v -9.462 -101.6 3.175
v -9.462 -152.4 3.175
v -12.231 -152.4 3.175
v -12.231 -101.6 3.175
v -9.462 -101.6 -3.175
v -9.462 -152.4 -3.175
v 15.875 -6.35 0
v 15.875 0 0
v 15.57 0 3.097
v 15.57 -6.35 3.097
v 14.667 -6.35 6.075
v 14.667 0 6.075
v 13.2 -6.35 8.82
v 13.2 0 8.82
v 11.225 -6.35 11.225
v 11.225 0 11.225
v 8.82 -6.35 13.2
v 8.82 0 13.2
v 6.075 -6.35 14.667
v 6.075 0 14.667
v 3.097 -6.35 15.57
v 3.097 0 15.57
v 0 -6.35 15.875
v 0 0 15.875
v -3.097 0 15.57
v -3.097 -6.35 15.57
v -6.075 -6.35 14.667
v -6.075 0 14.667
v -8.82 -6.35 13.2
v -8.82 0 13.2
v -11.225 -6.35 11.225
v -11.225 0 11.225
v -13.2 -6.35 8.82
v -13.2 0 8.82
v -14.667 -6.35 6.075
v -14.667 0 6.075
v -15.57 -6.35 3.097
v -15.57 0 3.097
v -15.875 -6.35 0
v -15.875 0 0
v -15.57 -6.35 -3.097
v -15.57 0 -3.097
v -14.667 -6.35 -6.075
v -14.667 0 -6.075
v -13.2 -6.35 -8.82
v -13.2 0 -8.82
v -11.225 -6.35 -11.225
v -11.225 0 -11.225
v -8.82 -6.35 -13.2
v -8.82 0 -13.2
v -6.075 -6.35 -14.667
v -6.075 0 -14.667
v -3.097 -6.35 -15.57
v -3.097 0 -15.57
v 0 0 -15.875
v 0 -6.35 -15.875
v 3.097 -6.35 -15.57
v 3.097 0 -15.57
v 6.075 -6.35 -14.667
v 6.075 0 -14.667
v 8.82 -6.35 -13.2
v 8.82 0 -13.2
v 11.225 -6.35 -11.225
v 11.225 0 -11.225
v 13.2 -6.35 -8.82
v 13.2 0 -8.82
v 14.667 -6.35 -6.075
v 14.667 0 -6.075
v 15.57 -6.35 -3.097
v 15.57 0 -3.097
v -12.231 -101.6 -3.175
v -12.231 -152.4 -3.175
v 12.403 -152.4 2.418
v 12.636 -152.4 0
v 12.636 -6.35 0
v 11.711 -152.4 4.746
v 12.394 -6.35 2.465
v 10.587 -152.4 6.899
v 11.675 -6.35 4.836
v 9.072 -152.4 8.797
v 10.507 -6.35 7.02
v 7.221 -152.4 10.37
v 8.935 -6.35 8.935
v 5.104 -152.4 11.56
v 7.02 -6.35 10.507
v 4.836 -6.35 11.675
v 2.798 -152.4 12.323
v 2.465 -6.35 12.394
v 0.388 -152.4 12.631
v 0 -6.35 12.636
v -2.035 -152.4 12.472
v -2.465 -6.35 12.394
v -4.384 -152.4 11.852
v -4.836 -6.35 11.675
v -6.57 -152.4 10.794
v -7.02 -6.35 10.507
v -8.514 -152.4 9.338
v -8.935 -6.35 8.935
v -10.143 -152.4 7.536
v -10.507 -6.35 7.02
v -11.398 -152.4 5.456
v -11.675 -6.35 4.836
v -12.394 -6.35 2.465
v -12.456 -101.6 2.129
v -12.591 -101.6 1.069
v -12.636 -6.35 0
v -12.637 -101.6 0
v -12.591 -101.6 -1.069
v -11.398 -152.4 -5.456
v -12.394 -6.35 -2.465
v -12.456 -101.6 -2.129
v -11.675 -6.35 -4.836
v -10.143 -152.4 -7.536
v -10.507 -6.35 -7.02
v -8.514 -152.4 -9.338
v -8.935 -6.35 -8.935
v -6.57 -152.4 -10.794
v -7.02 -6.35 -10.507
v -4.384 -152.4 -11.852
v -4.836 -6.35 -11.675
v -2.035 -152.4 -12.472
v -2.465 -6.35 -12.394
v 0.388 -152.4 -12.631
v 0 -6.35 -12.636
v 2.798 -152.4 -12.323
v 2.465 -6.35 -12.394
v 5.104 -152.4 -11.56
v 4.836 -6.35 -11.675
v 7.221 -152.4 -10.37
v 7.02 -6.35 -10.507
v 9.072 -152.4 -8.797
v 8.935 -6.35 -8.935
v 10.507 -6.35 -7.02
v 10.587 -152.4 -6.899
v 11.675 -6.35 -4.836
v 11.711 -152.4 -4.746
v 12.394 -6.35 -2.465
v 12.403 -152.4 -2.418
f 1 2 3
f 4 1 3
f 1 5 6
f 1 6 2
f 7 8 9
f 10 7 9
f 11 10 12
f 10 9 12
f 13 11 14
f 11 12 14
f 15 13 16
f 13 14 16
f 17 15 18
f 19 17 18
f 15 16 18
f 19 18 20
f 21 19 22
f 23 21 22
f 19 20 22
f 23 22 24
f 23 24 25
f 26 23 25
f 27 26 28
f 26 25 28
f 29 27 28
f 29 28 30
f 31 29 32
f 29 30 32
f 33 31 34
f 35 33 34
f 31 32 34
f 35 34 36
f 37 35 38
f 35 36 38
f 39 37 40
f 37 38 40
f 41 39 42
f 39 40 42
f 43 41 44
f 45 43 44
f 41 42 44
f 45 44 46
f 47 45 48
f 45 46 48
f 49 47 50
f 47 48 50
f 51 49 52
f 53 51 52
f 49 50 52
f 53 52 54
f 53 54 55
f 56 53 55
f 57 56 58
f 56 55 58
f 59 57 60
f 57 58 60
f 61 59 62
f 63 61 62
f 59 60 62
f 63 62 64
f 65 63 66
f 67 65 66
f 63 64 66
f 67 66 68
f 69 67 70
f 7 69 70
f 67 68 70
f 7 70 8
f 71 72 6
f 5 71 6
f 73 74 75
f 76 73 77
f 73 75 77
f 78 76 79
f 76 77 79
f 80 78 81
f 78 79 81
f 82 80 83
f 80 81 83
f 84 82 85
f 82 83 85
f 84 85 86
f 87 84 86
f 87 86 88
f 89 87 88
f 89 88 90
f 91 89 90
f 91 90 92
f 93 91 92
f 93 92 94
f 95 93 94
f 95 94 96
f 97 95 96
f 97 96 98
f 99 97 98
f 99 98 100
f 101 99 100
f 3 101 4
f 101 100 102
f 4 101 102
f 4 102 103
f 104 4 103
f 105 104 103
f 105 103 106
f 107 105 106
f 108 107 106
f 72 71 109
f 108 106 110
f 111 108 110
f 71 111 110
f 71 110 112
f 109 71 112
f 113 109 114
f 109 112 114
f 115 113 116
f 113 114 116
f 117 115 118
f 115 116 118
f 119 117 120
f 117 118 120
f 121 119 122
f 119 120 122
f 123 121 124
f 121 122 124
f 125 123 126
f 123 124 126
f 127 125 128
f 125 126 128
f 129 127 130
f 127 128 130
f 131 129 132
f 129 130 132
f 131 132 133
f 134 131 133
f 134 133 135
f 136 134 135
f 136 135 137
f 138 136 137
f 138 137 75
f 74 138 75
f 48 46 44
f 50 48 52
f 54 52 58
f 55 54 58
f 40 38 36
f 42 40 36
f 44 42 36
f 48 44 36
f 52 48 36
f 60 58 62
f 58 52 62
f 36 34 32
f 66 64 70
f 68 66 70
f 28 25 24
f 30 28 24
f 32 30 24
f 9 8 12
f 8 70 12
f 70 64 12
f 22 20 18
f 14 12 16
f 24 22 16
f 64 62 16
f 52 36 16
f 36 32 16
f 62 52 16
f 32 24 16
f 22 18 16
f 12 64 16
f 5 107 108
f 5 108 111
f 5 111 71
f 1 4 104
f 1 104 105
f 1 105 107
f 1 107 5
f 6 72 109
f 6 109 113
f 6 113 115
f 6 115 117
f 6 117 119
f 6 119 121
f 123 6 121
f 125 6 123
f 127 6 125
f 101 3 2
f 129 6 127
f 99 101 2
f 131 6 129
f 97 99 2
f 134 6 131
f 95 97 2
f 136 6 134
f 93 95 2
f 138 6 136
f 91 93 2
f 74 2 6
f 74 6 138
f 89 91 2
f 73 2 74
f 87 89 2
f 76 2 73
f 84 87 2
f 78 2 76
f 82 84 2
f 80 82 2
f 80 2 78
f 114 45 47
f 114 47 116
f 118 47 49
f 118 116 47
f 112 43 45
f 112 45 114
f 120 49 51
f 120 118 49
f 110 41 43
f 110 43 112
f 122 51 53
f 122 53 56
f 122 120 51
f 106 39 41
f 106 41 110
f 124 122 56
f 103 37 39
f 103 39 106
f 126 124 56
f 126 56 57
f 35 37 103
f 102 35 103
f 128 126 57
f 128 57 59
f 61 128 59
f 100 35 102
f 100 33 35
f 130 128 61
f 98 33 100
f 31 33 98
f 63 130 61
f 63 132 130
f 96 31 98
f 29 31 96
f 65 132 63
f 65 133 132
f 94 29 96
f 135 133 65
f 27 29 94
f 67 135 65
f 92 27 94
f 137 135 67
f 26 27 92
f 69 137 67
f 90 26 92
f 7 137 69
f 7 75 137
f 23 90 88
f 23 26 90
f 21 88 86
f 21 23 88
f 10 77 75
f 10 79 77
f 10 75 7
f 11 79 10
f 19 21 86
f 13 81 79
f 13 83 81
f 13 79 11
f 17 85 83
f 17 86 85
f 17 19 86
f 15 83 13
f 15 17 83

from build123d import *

# Parameters (mm, degrees)
F0_R     = 15.875
F0_R_2   = 12.6365
F1_DEPTH = 6.35
F2_R     = 12.6365
F3_DEPTH = 152.4
F5_DEPTH = 50.8


with BuildPart() as f1:
    # F0 (on Front) → F1 (new body)
    with BuildSketch(Plane.XZ):
        Circle(F0_R)
        Circle(F0_R_2, mode=Mode.SUBTRACT)
    extrude(amount=F1_DEPTH)

    # F2 (on Front) → F3 (join)
    with BuildSketch(Plane.XZ):
        Circle(F2_R)
    extrude(amount=F3_DEPTH)

    # F4 (on face) → F5 (cut)
    with BuildSketch(Plane.XZ.offset(152.4)):
        with BuildLine():
            Line((-9.4615, 3.175), (-12.2311286172, 3.175))
            ThreePointArc((-12.2311286172, 3.175), (-12.5347474849, 1.6003867469), (-12.6365, 0))
            ThreePointArc((-12.6365, 0), (-12.5347474849, -1.6003867469), (-12.2311286172, -3.175))
            Line((-12.2311286172, -3.175), (-9.4615, -3.175))
            Line((-9.4615, -3.175), (-9.4615, 3.175))
        make_face()
    extrude(amount=-F5_DEPTH, mode=Mode.SUBTRACT)


solid = f1.part
